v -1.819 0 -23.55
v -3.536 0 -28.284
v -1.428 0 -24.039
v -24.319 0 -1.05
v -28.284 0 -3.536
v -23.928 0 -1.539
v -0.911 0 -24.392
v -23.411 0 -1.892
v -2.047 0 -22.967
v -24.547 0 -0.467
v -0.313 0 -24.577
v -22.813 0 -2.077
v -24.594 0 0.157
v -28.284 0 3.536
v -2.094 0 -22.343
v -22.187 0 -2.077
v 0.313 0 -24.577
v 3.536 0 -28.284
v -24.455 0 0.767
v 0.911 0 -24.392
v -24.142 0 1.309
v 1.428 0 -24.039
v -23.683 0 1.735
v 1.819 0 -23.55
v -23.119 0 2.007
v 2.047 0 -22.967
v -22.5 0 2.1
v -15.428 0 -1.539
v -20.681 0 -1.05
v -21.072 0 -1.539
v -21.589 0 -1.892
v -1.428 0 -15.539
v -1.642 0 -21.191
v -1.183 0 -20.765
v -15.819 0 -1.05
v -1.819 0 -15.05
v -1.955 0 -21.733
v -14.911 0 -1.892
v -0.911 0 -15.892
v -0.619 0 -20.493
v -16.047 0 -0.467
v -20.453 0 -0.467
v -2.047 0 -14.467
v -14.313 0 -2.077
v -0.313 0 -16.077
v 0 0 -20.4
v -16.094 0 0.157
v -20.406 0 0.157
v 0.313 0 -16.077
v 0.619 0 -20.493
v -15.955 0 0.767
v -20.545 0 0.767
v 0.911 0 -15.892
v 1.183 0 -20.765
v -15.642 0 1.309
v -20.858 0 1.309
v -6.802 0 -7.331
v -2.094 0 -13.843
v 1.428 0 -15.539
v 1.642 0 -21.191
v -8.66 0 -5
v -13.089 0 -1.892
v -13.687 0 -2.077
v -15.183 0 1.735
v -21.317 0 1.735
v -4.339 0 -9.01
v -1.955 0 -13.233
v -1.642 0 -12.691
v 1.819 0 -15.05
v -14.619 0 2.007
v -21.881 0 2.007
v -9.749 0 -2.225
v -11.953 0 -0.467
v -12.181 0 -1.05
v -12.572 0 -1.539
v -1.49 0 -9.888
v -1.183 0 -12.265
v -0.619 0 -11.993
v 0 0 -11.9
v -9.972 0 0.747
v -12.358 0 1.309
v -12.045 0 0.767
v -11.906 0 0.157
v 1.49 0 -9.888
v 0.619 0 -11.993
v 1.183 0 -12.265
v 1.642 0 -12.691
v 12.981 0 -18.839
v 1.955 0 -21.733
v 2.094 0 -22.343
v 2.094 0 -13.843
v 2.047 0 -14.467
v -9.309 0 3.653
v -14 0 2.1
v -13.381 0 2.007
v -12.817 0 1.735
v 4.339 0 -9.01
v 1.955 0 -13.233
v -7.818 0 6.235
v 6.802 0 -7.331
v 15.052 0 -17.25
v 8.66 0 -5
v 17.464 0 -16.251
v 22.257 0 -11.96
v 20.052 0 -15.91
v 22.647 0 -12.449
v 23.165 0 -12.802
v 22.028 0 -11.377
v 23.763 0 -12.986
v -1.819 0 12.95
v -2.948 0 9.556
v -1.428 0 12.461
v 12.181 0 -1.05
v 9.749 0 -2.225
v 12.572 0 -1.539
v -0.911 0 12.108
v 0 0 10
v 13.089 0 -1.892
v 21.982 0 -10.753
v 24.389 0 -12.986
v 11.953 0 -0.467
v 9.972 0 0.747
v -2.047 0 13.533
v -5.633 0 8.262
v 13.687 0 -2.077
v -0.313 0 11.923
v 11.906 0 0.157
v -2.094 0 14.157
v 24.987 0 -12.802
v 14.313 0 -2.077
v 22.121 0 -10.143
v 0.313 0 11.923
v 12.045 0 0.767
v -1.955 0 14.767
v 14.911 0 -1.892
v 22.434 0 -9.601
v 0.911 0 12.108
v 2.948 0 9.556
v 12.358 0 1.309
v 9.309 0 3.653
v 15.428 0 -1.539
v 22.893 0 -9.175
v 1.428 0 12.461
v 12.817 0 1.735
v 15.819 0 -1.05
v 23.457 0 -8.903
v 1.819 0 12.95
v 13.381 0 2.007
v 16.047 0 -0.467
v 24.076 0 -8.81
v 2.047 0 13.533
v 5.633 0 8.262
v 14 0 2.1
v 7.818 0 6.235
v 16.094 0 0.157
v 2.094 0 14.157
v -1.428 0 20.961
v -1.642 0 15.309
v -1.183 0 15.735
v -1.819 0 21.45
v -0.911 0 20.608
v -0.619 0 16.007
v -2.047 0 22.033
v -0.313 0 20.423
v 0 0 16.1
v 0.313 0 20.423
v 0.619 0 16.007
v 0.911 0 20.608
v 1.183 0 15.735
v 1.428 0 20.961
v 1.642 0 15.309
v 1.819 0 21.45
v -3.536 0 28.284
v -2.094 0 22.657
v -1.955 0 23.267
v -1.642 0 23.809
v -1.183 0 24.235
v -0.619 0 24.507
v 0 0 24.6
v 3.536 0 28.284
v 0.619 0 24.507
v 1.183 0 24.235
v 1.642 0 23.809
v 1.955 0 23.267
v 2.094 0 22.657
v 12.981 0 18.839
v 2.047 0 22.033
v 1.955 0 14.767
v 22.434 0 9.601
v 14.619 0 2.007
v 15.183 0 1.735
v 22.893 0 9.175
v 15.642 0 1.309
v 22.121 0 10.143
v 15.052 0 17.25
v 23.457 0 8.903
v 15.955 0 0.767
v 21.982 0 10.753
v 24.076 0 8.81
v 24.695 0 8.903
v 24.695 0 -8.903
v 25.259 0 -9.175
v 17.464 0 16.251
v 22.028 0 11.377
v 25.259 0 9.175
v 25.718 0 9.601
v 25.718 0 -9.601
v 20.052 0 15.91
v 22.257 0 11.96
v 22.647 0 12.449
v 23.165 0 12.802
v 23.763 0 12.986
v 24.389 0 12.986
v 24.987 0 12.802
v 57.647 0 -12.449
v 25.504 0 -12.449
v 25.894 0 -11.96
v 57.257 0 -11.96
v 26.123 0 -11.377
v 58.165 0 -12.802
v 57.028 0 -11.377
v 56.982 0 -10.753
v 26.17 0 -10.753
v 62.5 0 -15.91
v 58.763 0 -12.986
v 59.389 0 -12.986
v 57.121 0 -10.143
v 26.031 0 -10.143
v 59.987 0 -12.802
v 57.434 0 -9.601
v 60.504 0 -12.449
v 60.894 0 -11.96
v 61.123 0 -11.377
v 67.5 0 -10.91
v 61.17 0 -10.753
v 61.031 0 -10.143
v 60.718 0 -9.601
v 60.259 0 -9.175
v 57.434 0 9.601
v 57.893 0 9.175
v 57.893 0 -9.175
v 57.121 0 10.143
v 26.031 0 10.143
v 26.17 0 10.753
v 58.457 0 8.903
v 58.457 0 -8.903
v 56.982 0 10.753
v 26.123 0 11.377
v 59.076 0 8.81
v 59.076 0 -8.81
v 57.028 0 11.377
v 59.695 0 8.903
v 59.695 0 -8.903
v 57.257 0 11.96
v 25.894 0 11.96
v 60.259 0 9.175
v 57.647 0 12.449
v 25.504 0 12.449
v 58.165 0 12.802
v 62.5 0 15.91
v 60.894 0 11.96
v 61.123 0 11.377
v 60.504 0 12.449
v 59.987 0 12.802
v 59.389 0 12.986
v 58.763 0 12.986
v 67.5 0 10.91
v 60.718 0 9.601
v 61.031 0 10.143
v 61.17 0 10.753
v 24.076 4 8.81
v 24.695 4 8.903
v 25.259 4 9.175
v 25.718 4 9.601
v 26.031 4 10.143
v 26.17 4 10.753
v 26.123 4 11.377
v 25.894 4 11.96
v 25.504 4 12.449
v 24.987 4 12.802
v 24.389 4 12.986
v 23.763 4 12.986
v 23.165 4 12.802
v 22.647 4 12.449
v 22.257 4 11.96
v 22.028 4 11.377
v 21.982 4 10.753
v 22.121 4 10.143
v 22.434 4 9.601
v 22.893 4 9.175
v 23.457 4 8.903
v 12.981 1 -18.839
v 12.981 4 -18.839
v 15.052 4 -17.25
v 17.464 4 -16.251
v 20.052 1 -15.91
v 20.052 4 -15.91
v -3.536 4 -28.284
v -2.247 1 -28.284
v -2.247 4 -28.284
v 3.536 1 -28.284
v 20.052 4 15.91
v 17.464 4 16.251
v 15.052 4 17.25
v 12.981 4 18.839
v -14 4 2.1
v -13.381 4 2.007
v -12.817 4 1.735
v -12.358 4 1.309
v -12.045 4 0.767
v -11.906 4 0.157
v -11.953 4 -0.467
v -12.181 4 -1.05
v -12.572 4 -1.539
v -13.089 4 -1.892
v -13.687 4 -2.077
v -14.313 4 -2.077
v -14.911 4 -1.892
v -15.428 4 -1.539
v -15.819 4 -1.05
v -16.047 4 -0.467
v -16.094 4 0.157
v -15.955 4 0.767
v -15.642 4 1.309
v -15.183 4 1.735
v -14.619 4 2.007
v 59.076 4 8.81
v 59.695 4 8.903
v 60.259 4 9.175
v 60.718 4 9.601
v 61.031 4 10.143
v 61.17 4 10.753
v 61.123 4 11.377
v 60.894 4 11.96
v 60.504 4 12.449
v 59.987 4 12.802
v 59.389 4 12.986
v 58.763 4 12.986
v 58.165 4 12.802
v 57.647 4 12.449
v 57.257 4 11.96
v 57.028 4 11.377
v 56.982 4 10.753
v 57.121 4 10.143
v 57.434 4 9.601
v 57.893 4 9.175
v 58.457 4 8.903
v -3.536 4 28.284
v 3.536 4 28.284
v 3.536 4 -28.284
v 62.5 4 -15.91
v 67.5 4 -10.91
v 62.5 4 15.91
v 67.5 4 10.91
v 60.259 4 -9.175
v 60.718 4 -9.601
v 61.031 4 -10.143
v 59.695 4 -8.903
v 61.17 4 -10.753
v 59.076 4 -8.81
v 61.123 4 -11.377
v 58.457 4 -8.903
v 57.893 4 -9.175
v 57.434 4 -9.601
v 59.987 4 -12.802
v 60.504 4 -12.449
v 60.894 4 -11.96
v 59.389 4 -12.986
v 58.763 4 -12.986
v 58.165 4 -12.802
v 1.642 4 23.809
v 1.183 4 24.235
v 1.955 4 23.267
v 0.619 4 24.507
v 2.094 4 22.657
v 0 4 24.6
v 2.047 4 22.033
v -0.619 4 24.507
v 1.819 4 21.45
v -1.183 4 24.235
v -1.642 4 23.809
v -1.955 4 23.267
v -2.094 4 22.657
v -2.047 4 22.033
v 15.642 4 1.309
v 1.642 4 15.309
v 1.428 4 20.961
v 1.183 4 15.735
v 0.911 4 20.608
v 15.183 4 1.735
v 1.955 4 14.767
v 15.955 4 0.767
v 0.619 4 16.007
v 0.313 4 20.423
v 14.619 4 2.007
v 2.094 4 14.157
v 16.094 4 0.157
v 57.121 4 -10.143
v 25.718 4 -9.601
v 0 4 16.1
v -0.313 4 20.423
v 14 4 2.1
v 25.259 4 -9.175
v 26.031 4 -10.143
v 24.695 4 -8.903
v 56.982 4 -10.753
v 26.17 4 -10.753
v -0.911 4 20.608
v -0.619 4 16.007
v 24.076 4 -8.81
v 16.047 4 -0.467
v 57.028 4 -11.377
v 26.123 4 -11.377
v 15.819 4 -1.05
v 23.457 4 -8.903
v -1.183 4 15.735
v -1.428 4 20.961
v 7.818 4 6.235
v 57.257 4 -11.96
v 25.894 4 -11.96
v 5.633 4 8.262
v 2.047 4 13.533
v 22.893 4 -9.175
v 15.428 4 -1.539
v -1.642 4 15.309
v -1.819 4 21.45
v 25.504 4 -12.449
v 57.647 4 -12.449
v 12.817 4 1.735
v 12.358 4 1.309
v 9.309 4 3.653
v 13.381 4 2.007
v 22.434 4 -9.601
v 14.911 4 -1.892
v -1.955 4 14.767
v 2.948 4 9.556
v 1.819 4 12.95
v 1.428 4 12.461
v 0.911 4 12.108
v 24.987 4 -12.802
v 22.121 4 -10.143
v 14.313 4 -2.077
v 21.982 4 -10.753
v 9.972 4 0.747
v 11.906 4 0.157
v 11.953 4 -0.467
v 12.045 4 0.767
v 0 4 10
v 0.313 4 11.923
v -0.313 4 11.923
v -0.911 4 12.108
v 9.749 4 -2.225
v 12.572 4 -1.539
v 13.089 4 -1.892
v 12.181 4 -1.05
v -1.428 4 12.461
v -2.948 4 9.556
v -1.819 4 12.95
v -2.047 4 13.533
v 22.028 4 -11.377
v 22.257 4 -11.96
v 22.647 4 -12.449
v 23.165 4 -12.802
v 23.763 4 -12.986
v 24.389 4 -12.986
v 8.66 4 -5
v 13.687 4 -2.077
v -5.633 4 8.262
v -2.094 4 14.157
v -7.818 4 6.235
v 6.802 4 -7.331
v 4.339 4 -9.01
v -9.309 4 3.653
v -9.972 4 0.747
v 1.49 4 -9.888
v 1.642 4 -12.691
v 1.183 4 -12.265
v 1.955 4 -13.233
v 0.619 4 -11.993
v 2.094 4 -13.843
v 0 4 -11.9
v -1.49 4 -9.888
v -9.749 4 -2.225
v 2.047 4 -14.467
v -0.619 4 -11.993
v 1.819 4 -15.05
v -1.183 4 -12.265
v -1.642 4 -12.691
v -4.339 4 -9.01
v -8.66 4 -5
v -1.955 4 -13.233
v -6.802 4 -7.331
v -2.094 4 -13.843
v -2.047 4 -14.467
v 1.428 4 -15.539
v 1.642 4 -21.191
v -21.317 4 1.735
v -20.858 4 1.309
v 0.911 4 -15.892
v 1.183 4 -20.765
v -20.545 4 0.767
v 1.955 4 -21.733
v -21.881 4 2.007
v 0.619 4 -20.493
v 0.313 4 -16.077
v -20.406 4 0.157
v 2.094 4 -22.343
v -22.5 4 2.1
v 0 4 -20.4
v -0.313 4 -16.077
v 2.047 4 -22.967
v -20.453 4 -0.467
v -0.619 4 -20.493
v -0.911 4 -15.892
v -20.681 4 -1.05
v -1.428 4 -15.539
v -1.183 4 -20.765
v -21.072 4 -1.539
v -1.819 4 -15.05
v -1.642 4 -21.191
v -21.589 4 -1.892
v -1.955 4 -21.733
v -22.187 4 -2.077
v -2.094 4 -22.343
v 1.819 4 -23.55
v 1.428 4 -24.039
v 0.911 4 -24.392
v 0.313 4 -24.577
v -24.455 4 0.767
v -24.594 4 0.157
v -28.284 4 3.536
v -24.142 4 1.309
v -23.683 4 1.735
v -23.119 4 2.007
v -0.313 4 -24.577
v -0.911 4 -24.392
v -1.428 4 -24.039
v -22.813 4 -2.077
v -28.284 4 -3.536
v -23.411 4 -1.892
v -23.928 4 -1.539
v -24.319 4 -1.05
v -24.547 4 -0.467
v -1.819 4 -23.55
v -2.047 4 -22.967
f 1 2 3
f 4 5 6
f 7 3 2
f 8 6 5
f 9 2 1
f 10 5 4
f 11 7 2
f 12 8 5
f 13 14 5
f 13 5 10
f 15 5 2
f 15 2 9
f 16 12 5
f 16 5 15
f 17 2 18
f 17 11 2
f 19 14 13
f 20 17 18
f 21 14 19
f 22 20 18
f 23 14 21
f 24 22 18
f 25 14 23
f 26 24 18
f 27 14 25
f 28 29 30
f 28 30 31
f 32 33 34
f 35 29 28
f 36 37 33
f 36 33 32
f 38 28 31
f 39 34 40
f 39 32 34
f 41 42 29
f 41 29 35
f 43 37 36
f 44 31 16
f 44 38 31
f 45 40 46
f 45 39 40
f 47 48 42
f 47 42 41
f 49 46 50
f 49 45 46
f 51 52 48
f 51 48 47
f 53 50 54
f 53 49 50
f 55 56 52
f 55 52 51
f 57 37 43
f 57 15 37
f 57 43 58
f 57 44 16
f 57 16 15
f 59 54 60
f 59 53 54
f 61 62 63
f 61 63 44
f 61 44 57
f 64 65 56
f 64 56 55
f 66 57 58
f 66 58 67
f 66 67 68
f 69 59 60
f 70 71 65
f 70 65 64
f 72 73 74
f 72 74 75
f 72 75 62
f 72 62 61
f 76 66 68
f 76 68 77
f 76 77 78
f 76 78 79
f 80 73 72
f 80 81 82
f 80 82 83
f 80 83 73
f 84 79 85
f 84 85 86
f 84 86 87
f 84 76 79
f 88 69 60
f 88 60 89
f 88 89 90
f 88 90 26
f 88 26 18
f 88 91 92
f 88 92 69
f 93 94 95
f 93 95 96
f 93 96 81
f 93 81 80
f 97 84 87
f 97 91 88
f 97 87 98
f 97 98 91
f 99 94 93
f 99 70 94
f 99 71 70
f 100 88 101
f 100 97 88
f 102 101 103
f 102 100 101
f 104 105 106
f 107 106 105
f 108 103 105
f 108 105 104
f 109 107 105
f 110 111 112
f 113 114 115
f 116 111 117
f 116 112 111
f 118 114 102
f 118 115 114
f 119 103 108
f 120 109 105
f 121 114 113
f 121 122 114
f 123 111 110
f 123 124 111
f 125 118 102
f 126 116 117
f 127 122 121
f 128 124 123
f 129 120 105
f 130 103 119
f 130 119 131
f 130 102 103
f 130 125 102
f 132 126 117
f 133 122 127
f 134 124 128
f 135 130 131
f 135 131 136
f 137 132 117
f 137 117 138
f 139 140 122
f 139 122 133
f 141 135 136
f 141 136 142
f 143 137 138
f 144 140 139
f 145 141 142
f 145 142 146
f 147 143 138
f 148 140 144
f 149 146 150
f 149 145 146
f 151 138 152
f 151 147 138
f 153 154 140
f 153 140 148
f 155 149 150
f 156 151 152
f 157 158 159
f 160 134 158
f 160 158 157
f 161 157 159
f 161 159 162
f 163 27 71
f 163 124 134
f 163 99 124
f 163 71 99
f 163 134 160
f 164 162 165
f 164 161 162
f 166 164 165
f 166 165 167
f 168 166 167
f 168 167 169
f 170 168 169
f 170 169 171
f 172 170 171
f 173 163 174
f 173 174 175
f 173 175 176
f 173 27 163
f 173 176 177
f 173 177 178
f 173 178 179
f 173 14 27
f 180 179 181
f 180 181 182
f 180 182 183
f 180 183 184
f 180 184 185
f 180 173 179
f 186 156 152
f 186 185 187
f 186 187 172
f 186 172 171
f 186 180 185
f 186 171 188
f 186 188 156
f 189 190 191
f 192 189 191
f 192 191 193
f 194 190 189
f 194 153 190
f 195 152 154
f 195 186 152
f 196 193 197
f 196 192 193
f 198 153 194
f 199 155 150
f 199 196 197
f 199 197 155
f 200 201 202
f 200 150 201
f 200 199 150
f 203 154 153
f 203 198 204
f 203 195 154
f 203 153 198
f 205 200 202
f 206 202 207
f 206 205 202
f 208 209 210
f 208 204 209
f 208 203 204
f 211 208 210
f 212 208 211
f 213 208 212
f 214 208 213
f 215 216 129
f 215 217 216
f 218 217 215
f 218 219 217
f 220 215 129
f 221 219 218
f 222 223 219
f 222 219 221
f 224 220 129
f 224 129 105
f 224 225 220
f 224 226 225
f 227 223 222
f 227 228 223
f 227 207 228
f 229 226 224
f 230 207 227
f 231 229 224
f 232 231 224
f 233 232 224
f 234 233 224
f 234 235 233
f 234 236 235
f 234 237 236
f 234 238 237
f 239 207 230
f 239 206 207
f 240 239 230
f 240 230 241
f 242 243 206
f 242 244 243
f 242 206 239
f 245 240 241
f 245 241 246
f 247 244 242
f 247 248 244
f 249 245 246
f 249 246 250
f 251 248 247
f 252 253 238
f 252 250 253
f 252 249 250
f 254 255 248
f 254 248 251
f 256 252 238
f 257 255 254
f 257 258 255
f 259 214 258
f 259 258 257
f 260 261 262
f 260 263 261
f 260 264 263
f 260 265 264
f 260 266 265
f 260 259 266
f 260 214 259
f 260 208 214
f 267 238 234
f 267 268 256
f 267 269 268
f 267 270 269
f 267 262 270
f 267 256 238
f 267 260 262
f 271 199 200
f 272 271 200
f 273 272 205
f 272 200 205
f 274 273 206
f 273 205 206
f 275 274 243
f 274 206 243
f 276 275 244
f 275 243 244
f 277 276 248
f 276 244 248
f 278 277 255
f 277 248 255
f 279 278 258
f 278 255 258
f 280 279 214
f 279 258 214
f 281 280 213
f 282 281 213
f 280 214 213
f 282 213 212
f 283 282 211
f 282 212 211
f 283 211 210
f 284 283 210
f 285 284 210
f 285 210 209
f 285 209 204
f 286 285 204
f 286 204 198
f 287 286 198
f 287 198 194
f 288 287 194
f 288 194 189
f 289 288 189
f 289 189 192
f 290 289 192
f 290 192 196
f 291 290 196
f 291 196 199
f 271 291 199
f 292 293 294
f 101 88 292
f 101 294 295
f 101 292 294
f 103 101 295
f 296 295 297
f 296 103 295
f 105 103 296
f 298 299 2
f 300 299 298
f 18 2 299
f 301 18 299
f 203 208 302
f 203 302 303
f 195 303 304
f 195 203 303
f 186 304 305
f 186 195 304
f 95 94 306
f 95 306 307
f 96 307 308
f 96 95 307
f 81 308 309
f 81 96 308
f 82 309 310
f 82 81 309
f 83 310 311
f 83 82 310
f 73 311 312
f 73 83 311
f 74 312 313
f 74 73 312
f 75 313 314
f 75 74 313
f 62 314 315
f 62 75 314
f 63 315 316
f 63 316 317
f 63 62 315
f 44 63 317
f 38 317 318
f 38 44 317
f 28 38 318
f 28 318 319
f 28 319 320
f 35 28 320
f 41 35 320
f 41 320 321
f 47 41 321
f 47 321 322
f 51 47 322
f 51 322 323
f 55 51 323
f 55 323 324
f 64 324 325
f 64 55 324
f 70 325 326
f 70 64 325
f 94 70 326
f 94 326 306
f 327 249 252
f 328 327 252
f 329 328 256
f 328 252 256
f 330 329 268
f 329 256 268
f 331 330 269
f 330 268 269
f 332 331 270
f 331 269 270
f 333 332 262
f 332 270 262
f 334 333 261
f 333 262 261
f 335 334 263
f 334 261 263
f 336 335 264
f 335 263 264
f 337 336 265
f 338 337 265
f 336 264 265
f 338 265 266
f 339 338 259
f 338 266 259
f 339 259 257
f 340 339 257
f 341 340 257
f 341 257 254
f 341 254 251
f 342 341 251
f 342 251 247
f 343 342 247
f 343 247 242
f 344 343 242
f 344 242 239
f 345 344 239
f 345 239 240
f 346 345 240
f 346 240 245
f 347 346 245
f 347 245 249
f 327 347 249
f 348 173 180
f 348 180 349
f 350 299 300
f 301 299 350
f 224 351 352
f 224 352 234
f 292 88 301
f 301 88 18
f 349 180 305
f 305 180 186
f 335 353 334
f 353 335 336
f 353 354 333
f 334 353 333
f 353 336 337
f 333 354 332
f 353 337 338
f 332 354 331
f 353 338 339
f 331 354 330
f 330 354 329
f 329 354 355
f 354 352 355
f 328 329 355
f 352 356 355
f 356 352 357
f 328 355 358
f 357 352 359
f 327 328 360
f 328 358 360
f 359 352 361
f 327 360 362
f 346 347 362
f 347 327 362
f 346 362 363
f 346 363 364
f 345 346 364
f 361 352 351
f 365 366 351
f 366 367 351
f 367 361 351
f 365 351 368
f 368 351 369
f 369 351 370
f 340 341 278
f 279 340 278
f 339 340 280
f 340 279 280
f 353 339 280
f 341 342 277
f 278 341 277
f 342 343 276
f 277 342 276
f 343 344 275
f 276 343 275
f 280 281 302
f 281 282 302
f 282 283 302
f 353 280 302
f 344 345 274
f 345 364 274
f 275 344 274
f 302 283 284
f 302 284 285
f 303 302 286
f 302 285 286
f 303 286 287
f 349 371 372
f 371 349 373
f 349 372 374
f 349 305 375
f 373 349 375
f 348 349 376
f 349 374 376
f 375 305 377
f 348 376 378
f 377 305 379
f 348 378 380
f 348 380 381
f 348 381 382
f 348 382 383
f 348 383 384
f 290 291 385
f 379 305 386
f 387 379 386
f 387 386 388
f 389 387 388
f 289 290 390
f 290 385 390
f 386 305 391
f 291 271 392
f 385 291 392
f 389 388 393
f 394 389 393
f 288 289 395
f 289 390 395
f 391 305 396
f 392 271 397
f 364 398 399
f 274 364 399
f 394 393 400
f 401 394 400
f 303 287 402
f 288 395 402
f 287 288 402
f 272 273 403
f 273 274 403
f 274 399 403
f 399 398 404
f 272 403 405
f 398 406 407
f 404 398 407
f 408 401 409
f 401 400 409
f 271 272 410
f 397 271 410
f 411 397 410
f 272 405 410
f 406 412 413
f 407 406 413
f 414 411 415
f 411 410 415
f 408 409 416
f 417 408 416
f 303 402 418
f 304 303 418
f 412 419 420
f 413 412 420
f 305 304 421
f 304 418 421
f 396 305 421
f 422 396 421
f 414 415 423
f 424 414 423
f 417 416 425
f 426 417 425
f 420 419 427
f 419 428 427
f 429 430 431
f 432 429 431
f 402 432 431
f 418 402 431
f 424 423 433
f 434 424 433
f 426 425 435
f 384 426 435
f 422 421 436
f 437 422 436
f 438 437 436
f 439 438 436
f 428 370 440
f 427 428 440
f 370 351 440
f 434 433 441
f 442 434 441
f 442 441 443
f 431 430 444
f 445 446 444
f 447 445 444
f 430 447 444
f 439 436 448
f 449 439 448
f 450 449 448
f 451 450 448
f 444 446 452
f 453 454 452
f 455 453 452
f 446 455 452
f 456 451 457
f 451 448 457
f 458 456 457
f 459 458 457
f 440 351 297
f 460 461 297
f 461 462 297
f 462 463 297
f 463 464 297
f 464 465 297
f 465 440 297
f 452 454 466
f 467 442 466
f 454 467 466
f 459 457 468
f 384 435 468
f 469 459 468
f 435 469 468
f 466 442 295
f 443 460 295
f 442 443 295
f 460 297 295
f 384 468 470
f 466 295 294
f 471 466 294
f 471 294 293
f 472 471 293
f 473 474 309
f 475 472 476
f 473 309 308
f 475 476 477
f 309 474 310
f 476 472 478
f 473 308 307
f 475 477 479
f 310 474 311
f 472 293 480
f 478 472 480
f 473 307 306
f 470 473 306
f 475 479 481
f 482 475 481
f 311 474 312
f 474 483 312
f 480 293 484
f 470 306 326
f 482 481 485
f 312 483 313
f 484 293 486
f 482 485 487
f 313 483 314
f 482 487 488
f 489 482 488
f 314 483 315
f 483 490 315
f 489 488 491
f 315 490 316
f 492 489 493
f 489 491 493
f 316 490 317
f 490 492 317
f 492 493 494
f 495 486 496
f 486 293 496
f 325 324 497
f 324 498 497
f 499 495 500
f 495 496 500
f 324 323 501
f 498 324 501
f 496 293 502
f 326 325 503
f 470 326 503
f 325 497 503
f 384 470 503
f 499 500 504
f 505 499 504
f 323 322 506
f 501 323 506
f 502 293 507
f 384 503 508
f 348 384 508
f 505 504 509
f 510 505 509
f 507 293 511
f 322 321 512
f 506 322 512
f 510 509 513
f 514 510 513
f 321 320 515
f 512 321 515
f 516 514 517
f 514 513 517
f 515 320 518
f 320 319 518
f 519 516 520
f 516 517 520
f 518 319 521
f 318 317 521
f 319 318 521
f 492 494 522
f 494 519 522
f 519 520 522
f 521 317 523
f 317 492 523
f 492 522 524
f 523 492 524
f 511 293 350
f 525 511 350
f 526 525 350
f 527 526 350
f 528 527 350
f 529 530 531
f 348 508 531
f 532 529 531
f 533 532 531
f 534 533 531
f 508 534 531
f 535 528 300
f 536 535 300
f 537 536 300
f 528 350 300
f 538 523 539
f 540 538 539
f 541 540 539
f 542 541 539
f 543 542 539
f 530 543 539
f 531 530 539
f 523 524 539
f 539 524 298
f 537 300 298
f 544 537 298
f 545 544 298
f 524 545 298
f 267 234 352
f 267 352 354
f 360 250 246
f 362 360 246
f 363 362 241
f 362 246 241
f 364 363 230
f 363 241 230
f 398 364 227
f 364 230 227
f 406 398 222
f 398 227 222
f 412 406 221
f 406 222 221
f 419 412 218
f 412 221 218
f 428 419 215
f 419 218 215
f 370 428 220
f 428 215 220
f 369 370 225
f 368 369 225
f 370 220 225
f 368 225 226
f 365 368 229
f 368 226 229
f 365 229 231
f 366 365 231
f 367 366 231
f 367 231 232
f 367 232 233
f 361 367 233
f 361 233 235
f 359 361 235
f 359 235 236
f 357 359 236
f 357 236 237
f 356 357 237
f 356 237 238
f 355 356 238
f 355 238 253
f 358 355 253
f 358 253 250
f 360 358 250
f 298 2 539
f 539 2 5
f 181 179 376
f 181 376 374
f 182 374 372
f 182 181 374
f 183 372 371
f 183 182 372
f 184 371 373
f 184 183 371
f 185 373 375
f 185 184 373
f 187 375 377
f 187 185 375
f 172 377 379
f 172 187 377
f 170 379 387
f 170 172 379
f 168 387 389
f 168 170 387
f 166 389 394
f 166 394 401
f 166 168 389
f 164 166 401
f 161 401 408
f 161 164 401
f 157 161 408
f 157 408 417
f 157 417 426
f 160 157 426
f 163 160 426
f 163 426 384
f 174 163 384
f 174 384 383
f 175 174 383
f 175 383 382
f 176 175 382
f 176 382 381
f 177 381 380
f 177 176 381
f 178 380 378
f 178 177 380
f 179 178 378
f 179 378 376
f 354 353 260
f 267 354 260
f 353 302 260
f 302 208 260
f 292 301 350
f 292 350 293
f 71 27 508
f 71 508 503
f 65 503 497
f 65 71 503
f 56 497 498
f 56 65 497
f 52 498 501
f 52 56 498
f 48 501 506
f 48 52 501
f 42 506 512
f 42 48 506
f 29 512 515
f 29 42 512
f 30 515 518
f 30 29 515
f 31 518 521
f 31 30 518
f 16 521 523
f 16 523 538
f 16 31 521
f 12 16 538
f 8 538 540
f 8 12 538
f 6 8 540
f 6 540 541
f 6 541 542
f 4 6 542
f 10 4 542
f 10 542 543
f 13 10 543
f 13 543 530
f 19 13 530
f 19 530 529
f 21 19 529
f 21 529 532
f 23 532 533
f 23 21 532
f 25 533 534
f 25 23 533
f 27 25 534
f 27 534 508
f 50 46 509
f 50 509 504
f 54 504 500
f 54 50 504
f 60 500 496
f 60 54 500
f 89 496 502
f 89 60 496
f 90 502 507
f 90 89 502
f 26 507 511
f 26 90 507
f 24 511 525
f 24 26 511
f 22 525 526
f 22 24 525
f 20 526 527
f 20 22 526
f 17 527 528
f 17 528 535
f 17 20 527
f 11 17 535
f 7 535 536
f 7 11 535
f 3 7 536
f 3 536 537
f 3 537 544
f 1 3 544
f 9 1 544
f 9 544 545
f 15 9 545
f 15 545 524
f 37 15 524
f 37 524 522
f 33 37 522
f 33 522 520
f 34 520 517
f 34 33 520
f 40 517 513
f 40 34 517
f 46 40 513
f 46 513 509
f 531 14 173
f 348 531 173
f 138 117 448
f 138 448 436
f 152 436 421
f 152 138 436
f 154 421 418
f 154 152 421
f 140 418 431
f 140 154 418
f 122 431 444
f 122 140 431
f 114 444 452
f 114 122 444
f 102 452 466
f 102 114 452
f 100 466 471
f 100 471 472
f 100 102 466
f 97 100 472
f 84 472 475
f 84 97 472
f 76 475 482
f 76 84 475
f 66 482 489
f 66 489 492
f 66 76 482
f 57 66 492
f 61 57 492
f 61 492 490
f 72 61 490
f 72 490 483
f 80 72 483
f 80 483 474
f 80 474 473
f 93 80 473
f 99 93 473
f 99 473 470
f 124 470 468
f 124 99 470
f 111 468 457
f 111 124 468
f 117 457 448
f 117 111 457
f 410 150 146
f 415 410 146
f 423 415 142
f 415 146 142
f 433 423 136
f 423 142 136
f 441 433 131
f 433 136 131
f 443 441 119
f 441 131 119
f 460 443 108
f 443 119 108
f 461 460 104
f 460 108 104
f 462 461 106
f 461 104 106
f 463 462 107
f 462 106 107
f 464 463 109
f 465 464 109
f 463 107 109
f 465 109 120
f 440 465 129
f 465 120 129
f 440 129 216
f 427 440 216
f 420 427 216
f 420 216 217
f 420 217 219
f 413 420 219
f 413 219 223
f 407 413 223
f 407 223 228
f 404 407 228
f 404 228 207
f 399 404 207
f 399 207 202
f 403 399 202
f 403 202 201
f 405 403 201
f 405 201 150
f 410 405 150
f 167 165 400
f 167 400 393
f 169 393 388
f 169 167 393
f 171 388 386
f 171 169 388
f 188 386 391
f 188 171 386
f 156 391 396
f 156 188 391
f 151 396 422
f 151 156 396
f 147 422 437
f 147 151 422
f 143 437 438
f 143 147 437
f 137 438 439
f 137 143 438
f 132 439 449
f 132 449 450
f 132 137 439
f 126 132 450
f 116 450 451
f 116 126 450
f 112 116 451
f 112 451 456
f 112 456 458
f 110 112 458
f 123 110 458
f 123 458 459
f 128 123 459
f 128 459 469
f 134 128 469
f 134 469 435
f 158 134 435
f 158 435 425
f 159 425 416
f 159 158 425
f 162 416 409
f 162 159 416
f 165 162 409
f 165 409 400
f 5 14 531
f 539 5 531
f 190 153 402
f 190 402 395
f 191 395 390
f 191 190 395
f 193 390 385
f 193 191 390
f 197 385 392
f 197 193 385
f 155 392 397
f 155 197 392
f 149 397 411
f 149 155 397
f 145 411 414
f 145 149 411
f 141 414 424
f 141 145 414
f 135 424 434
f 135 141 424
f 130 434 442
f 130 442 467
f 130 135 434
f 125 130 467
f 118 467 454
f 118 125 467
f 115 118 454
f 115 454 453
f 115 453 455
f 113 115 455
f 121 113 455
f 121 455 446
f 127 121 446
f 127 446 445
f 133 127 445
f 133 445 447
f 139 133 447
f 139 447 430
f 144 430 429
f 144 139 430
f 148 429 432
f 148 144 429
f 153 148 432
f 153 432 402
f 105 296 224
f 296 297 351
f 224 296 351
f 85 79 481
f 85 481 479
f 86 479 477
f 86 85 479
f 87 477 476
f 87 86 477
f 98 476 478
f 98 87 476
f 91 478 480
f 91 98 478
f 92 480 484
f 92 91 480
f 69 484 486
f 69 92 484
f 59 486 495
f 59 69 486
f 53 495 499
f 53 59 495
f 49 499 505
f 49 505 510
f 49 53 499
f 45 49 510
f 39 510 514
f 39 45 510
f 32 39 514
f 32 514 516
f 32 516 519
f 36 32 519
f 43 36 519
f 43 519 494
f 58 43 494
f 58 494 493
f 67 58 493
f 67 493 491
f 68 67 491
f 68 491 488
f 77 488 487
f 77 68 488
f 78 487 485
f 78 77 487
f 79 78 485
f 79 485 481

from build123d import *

# Parameters (mm, degrees)
SKETCH_1_R          = 2.1
SKETCH_1_R_2        = 10.5
SKETCH_1_R_3        = 10
EXTRUDE_1_DEPTH     = 4
CHAMFER_1_SIZE      = 5
FILLET_1_R          = 10
SKETCH_2_R          = 2.1
CUT_EXTRUDE_1_DEPTH = 10
EXTRUDE_START       = -3
SKETCH_3_R          = 1.6
EXTRUDE_2_DEPTH     = 3
FILLET_2_R          = 3
FILLET_3_R          = 11
SKETCH_4_R          = 1.6
EXTRUDE_3_DEPTH     = 3
FILLET_4_R          = 10
CHAMFER_2_SIZE      = 2
CHAMFER_2_SIZE2     = 1.851556395
FILLET_5_R          = 10
CUT_EXTRUDE_START   = -10
CUT_EXTRUDE_2_DEPTH = 10
CUT_EXTRUDE_3_DEPTH = 10
CHAMFER_3_SIZE      = 5


with BuildPart() as part:
    # 草图1 → 凸台-拉伸1 (new body)
    with BuildSketch(Plane(origin=(0, 0, 0), x_dir=(1, 0, 0), z_dir=(0, 1, 0))):
        Polygon((0, 31.819805153), (-31.819805153, 0), (0, -31.819805153), (15.909902577, -15.909902577), (67.5, -15.909902577), (67.5, -22.5), (112.5, -22.5), (112.5, 22.5), (67.5, 22.5), (67.5, 15.909902577), (15.909902577, 15.909902577), align=None)
        with Locations(Location((0, 14, 0), (0, 0, 270))):
            Circle(SKETCH_1_R, mode=Mode.SUBTRACT)
        with Locations(Location((14, 0, 0), (0, 0, 270))):
            Circle(SKETCH_1_R, mode=Mode.SUBTRACT)
        with Locations(Location((0, -14, 0), (0, 0, 270))):
            Circle(SKETCH_1_R, mode=Mode.SUBTRACT)
        with Locations(Location((-14, 0, 0), (0, 0, 270))):
            Circle(SKETCH_1_R, mode=Mode.SUBTRACT)
        with Locations(Location((90, 0, 0), (0, 0, 270))):
            Circle(SKETCH_1_R_2, mode=Mode.SUBTRACT)
        with Locations(Location((0, 22.5, 0), (0, 0, 270))):
            Circle(SKETCH_1_R, mode=Mode.SUBTRACT)
        with Locations(Location((0, -22.5, 0), (0, 0, 270))):
            Circle(SKETCH_1_R, mode=Mode.SUBTRACT)
        with Locations(Location((0, 0, 0), (0, 0, 270))):
            Circle(SKETCH_1_R_3, mode=Mode.SUBTRACT)
        with Locations(Location((-22.5, 0, 0), (0, 0, 270))):
            Circle(SKETCH_1_R, mode=Mode.SUBTRACT)
    extrude(amount=EXTRUDE_1_DEPTH)

    # 倒角1
    chamfer_1_edges = [part.edges().sort_by_distance(p)[0] for p in [
        (112.5, 2, -22.5),
        (112.5, 2, 22.5),
        (0, 2, 31.819805153),
        (-31.819805153, 2, 0),
        (0, 2, -31.819805153),
    ]]
    chamfer(chamfer_1_edges, length=CHAMFER_1_SIZE)

    # 圆角1
    # the kernel refuses this fillet: 10 mm, written as the material it adds along each edge
    with BuildSketch(Plane(origin=(15.909902577, 0, -15.909902577), x_dir=(-0.707106781186552, 0, -0.707106781186543), z_dir=(0, 1, 0))) as fillet_1_piece_1:
        with BuildLine():
            CenterArc((FILLET_1_R * 0.414213562373, -FILLET_1_R), FILLET_1_R, 90, 45)
            Line((-FILLET_1_R * 0.292893218813, -FILLET_1_R * 0.292893218813), (-FILLET_1_R * 0.307035354437, -FILLET_1_R * 0.27875108319))
            Line((-FILLET_1_R * 0.307035354437, -FILLET_1_R * 0.27875108319), (-FILLET_1_R * 0.00828427124746, FILLET_1_R * 0.02))
            Line((-FILLET_1_R * 0.00828427124746, FILLET_1_R * 0.02), (FILLET_1_R * 0.414213562373, FILLET_1_R * 0.02))
            Line((FILLET_1_R * 0.414213562373, FILLET_1_R * 0.02), (FILLET_1_R * 0.414213562373, 0))
        make_face()
    extrude(amount=4)
    with BuildSketch(Plane(origin=(15.909902577, 0, 15.909902577), x_dir=(-0.7071067811865422, 0, 0.707106781186553), z_dir=(0, 1, 0))) as fillet_1_piece_2:
        with BuildLine():
            CenterArc((FILLET_1_R * 0.414213562373, FILLET_1_R), FILLET_1_R, 225, 45)
            Line((-FILLET_1_R * 0.292893218813, FILLET_1_R * 0.292893218813), (-FILLET_1_R * 0.307035354437, FILLET_1_R * 0.27875108319))
            Line((-FILLET_1_R * 0.307035354437, FILLET_1_R * 0.27875108319), (-FILLET_1_R * 0.00828427124746, -FILLET_1_R * 0.02))
            Line((-FILLET_1_R * 0.00828427124746, -FILLET_1_R * 0.02), (FILLET_1_R * 0.414213562373, -FILLET_1_R * 0.02))
            Line((FILLET_1_R * 0.414213562373, -FILLET_1_R * 0.02), (FILLET_1_R * 0.414213562373, 0))
        make_face()
    extrude(amount=4)
    with BuildSketch(Plane(origin=(67.5, 0, 15.909902577), x_dir=(-1, 0, 0), z_dir=(0, 1, 0))) as fillet_1_piece_3:
        with BuildLine():
            CenterArc((9.400668296, 10), FILLET_1_R, 199.937217397, 70.062782603)
            Line((0, 6.590097423), (-0.188013366, 6.521899372))
            ThreePointArc((-0.188013366, 6.521899372), (-0.2, 3.295048712), (-0.2, 0))
            Line((-0.2, 0), (0, -0.2))
            Line((0, -0.2), (9.400668296, -0.2))
            Line((9.400668296, -0.2), (9.400668296, 0))
        make_face()
    extrude(amount=4)
    with BuildSketch(Plane(origin=(67.5, 0, -15.909902577), x_dir=(-1, 0, 0), z_dir=(0, 1, 0))) as fillet_1_piece_4:
        with BuildLine():
            CenterArc((9.400668296, -10), FILLET_1_R, 90, 70.062782603)
            Line((0, -6.590097423), (-0.188013366, -6.521899372))
            ThreePointArc((-0.188013366, -6.521899372), (-0.2, -3.295048712), (-0.2, 0))
            Line((-0.2, 0), (0, 0.2))
            Line((0, 0.2), (9.400668296, 0.2))
            Line((9.400668296, 0.2), (9.400668296, 0))
        make_face()
    extrude(amount=4)

    # 草图2 → 切除-拉伸1 (cut)
    with BuildSketch(Plane.XZ):
        with Locations(Location((106.464466094, 16.464466094, 0), (0, 0, 270))):
            Circle(SKETCH_2_R)
        with Locations(Location((106.464466094, -16.464466094, 0), (0, 0, 270))):
            Circle(SKETCH_2_R)
        with Locations(Location((73.535533906, -16.464466094, 0), (0, 0, 90))):
            Circle(SKETCH_2_R)
        with Locations(Location((73.535533906, 16.464466094, 0), (0, 0, 90))):
            Circle(SKETCH_2_R)
        with Locations(Location((24.075684952, 10.909902577, 0), (0, 0, 270))):
            Circle(SKETCH_2_R)
        with Locations(Location((59.075684952, 10.909902577, 0), (0, 0, 270))):
            Circle(SKETCH_2_R)
        with Locations(Location((59.075684952, -10.909902577, 0), (0, 0, 90))):
            Circle(SKETCH_2_R)
        with Locations(Location((24.075684952, -10.909902577, 0), (0, 0, 90))):
            Circle(SKETCH_2_R)
    extrude(amount=-CUT_EXTRUDE_1_DEPTH, mode=Mode.SUBTRACT)

    # 草图3 → 凸台-拉伸2 (add)
    with BuildSketch(Plane(origin=(0, 4, 0), x_dir=(1, 0, 0), z_dir=(0, 1, 0)).offset(EXTRUDE_START)):
        with BuildLine():
            Line((3.535533906, 28.284271247), (40.057636417, 81.344203773))
            ThreePointArc((40.057636417, 81.344203773), (45.94930127, 83.86671265), (50.75784592, 79.629654221))
            Line((50.75784592, 79.629654221), (67.5, 22.5))
            ThreePointArc((67.5, 22.5), (63.839583189, 17.721525883), (58.099331704, 15.909902577))
            Line((58.099331704, 15.909902577), (20.0520382, 15.909902577))
            ThreePointArc((20.0520382, 15.909902577), (16.225203877, 16.671107252), (12.980970389, 18.838834765))
            Line((12.980970389, 18.838834765), (3.535533906, 28.284271247))
        make_face()
        with Locations(Location((45, 77.942286341, 0), (0, 0, 270))):
            Circle(SKETCH_3_R, mode=Mode.SUBTRACT)
        Polygon((16.491758356, 29.470182421), (43.526560522, 68.746803428), (56.080145943, 25.909902577), (20.0520382, 25.909902577), align=None, mode=Mode.SUBTRACT)
    extrude(amount=EXTRUDE_2_DEPTH)

    # 圆角2
    fillet_2_edges = [part.edges().sort_by_distance(p)[0] for p in [
        (16.491758356, 2.5, -29.470182421),
        (43.526560522, 2.5, -68.746803428),
        (56.080145943, 2.5, -25.909902577),
        (20.0520382, 2.5, -25.909902577),
    ]]
    fillet(fillet_2_edges, radius=FILLET_2_R)

    # 圆角3
    fillet_3_edges = [part.edges().sort_by_distance(p)[0] for p in [
        (3.535533906, 2.5, -28.284271247),
        (67.5, 2.5, -22.5),
    ]]
    fillet(fillet_3_edges, radius=FILLET_3_R)

    # 草图4 → 凸台-拉伸3 (add)
    with BuildSketch(Plane(origin=(0, 4, 0), x_dir=(1, 0, 0), z_dir=(0, 1, 0)).offset(EXTRUDE_START)):
        with BuildLine():
            Line((45.94930127, 83.86671265), (81.347717681, 83.86671265))
            Line((81.347717681, 83.86671265), (107.5, 22.5))
            Line((107.5, 22.5), (97.716806526, 22.5))
            Line((97.716806526, 22.5), (75.4, 74.86671265))
            Line((75.4, 74.86671265), (52.153651701, 74.86671265))
            Line((52.153651701, 74.86671265), (50.75784592, 79.629654221))
            ThreePointArc((50.75784592, 79.629654221), (48.966689034, 82.443994695), (45.94930127, 83.86671265))
        make_face()
        with Locations(Location((78, 77.942286341, 0), (0, 0, 270))):
            Circle(SKETCH_4_R, mode=Mode.SUBTRACT)
    extrude(amount=EXTRUDE_3_DEPTH)

    # 圆角4
    fillet_4_edges = [part.edges().sort_by_distance(p)[0] for p in [
        (97.716806526, 2.5, -22.5),
        (75.4, 2.5, -74.86671265),
        (52.153651701, 2.5, -74.86671265),
    ]]
    fillet(fillet_4_edges, radius=FILLET_4_R)

    # 倒角2
    chamfer_2_edges = [part.edges().sort_by_distance(p)[0] for p in [
        (81.347717681, 2.5, -83.86671265),
    ]]
    chamfer_2_side = [part.faces().sort_by_distance(p)[0] for p in [
        (63.648509476, 2.5, -83.86671265),
    ]]
    chamfer(chamfer_2_edges, length=CHAMFER_2_SIZE, length2=CHAMFER_2_SIZE2, reference=chamfer_2_side[0])

    # 圆角5
    fillet_5_edges = [part.edges().sort_by_distance(p)[0] for p in [
        (107.5, 2.5, -22.5),
    ]]
    fillet(fillet_5_edges, radius=FILLET_5_R)

    # 草图5 → 切除-拉伸2 (cut)
    with BuildSketch(Plane(origin=(0, 4, 0), x_dir=(1, 0, 0), z_dir=(0, 1, 0)).offset(CUT_EXTRUDE_START)):
        with BuildLine():
            Line((67.5, -22.5), (67.5, -34.552858439))
            Line((67.5, -34.552858439), (139.474887753, -46.263885721))
            Line((139.474887753, -46.263885721), (130.519396302, 71.535271055))
            Line((130.519396302, 71.535271055), (50.264415224, 107.357236858))
            Line((50.264415224, 107.357236858), (-15.814227001, 52.524784707))
            Line((-15.814227001, 52.524784707), (-3.535533906, 28.284271247))
            Line((-3.535533906, 28.284271247), (3.535533906, 28.284271247))
            Line((3.535533906, 28.284271247), (12.980970389, 18.838834765))
            ThreePointArc((12.980970389, 18.838834765), (16.225203877, 16.671107252), (20.0520382, 15.909902577))
            Line((20.0520382, 15.909902577), (58.099331704, 15.909902577))
            ThreePointArc((58.099331704, 15.909902577), (63.839583189, 17.721525883), (67.5, 22.5))
            Line((67.5, 22.5), (67.5, -22.5))
        make_face()
    extrude(amount=CUT_EXTRUDE_2_DEPTH, mode=Mode.SUBTRACT)

    # 草图6 → 切除-拉伸3 (cut)
    with BuildSketch(Plane(origin=(0, 4, 0), x_dir=(1, 0, 0), z_dir=(0, 1, 0))):
        Polygon((58.099331704, 15.909902577), (80.044473587, 15.909902577), (76.388599313, 31.9888999), (52.293064323, 28.831553936), align=None)
        Polygon((58.099331704, -15.909902577), (78.21653645, -15.909902577), (69.071902646, -30.327138866), (59.799179703, -28.451958172), align=None)
    extrude(amount=-CUT_EXTRUDE_3_DEPTH, mode=Mode.SUBTRACT)

    # 倒角3
    chamfer_3_edges = [part.edges().sort_by_distance(p)[0] for p in [
        (67.5, 2, -15.909902577),
        (67.5, 2, 15.909902577),
    ]]
    chamfer(chamfer_3_edges, length=CHAMFER_3_SIZE)


solid = part.part
